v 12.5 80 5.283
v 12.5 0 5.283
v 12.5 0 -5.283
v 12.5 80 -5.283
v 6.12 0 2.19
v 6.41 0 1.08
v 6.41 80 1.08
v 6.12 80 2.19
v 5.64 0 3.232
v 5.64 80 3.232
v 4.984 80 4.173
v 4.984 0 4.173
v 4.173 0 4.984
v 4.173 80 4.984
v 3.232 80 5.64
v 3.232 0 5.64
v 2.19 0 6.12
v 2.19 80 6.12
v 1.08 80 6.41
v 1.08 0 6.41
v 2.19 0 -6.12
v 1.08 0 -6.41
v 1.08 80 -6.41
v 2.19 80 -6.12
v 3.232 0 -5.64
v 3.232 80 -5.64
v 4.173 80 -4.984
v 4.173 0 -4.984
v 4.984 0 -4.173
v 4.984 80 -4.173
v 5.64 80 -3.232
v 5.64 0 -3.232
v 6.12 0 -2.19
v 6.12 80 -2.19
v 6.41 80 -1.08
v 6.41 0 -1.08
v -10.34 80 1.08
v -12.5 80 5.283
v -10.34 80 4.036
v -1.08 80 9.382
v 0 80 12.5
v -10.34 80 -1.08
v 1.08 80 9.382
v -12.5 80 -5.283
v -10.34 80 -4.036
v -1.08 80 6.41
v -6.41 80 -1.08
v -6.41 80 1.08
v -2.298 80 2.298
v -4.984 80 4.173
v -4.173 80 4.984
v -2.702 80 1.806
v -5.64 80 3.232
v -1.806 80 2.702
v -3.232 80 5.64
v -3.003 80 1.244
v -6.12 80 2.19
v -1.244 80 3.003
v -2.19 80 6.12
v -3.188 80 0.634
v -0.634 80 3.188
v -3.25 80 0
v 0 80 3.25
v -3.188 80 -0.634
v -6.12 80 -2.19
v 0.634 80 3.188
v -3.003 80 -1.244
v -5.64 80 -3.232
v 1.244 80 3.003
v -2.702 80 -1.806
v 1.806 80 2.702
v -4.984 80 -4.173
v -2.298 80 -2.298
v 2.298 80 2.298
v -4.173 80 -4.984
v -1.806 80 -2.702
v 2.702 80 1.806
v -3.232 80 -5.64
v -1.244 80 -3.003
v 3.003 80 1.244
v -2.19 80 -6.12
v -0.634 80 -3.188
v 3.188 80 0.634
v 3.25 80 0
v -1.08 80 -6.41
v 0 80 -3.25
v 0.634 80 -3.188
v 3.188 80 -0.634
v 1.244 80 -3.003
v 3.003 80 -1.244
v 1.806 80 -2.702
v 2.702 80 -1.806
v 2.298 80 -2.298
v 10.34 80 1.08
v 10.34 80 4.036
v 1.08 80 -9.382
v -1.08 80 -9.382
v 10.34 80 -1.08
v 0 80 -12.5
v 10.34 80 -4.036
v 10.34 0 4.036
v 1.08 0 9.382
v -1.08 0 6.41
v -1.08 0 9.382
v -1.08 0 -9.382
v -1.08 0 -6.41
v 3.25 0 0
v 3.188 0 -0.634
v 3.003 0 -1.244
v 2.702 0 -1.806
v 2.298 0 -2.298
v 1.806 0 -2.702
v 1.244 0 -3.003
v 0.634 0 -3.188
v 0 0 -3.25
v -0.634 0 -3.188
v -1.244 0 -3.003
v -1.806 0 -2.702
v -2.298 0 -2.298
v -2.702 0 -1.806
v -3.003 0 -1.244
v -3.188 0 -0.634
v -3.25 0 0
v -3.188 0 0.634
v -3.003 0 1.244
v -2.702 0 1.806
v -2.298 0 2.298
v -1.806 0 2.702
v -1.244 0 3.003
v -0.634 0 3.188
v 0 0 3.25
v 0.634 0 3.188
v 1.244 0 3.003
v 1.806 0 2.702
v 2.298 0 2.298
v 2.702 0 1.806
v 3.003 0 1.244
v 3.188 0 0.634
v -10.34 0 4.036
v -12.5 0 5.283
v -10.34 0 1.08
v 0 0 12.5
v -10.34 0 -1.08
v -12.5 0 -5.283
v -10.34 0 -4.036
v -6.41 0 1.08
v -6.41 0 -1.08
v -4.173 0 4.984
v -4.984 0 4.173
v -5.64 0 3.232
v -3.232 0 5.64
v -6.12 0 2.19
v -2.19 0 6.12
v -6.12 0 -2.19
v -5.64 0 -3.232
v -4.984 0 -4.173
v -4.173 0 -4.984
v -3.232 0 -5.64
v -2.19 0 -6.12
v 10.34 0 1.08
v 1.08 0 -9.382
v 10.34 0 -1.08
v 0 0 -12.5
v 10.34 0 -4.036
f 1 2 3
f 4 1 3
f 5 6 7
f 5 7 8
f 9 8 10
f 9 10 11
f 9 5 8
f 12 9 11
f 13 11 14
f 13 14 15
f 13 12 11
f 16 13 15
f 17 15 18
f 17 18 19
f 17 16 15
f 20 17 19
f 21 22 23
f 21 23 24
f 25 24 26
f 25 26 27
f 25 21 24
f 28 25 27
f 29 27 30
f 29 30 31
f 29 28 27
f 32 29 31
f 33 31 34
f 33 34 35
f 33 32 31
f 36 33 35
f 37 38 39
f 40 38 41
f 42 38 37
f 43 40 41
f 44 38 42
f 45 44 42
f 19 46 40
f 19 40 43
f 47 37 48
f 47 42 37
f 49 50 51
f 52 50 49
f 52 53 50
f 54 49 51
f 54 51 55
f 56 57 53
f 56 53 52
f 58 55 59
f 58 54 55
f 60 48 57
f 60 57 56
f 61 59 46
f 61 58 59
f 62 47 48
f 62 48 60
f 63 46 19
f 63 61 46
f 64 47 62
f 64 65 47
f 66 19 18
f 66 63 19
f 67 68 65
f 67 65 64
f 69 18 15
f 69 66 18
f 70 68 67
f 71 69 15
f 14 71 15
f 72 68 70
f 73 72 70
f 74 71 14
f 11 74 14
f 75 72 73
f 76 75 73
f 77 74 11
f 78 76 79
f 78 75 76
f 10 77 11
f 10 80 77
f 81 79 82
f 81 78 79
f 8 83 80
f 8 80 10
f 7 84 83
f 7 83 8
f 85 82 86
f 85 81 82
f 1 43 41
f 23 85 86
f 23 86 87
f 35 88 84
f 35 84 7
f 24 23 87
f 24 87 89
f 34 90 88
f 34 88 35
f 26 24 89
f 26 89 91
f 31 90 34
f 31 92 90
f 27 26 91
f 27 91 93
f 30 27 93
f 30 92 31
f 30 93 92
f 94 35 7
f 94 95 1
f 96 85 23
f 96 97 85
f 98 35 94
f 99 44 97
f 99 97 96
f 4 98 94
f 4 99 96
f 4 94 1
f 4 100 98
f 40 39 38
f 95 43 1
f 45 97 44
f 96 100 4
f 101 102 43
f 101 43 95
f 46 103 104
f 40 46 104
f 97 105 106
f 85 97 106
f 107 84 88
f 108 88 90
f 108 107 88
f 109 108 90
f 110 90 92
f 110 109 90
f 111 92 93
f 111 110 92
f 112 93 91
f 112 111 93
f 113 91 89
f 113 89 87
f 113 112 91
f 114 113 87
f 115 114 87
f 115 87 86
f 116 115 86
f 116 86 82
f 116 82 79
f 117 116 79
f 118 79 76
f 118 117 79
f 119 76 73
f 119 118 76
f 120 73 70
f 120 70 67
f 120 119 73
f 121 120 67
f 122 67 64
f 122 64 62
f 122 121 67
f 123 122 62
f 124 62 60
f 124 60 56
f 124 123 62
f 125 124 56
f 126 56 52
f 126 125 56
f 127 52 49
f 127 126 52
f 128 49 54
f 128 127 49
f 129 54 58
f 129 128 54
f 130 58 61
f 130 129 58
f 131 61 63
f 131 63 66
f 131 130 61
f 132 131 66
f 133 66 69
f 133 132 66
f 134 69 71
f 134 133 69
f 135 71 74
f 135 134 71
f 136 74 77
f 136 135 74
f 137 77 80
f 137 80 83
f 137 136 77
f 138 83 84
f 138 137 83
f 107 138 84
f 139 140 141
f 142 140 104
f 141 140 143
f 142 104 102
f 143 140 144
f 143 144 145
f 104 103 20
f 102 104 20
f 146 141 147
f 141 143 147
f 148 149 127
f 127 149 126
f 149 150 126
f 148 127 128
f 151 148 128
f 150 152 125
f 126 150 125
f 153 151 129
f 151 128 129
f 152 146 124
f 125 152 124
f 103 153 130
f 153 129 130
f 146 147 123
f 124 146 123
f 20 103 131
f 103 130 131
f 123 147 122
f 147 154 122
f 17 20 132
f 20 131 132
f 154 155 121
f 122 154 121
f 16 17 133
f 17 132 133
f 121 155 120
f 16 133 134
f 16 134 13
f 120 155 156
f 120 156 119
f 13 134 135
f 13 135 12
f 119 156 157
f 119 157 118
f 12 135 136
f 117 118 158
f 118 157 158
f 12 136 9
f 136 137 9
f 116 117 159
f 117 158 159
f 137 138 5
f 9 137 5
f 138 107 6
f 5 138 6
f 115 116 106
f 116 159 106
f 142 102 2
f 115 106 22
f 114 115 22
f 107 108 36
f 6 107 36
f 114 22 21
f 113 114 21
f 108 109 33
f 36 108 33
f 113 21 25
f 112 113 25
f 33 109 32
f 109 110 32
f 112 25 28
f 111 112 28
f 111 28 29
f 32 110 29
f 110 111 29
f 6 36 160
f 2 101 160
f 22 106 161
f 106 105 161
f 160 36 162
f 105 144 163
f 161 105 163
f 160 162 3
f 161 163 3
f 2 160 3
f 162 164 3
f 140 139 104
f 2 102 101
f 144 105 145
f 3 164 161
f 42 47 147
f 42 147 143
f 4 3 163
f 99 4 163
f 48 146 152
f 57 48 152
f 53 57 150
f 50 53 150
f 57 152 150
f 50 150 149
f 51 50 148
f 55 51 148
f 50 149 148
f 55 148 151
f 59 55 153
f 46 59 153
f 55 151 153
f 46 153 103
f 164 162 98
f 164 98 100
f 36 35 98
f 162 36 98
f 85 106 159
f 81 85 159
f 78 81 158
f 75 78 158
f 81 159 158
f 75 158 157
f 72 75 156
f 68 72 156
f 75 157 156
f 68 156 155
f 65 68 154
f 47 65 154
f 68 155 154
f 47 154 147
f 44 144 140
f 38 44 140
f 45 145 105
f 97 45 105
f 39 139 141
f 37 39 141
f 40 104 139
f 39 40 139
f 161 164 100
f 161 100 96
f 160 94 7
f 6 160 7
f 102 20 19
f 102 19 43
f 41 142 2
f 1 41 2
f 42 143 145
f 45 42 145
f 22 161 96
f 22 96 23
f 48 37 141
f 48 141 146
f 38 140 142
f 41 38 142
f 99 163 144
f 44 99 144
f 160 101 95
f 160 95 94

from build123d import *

# Parameters (mm, degrees)
SKETCH1_R           = 3.25
BOSS_EXTRUDE2_DEPTH = 80


with BuildPart() as part:
    # Sketch1 → Boss-Extrude2 (new body)
    with BuildSketch(Plane(origin=(0, 0, 0), x_dir=(1, 0, 0), z_dir=(0, 1, 0))):
        Polygon((-12.5, 5.283121635), (-12.5, -5.283121635), (0, -12.5), (12.5, -5.283121635), (12.5, 5.283121635), (0, 12.5), align=None)
        Circle(SKETCH1_R, mode=Mode.SUBTRACT)
        with BuildLine():
            Line((-1.08, 9.382308546), (-1.08, 6.409648976))
            ThreePointArc((-1.08, 6.409648976), (-4.596194078, 4.596194078), (-6.409648976, 1.08))
            Line((-6.409648976, 1.08), (-10.34, 1.08))
            Line((-10.34, 1.08), (-10.34, 4.036045054))
            Line((-10.34, 4.036045054), (-1.08, 9.382308546))
        make_face(mode=Mode.SUBTRACT)
        with BuildLine():
            Line((1.08, 9.382308546), (1.08, 6.409648976))
            ThreePointArc((1.08, 6.409648976), (4.596194078, 4.596194078), (6.409648976, 1.08))
            Line((6.409648976, 1.08), (10.34, 1.08))
            Line((10.34, 1.08), (10.34, 4.036045054))
            Line((10.34, 4.036045054), (1.08, 9.382308546))
        make_face(mode=Mode.SUBTRACT)
        with BuildLine():
            Line((-10.34, -1.08), (-6.409648976, -1.08))
            ThreePointArc((-6.409648976, -1.08), (-4.596194078, -4.596194078), (-1.08, -6.409648976))
            Line((-1.08, -6.409648976), (-1.08, -9.382308546))
            Line((-1.08, -9.382308546), (-10.34, -4.036045054))
            Line((-10.34, -4.036045054), (-10.34, -1.08))
        make_face(mode=Mode.SUBTRACT)
        with BuildLine():
            Line((1.08, -6.409648976), (1.08, -9.382308546))
            Line((1.08, -9.382308546), (10.34, -4.036045054))
            Line((10.34, -4.036045054), (10.34, -1.08))
            Line((10.34, -1.08), (6.409648976, -1.08))
            ThreePointArc((6.409648976, -1.08), (4.596194078, -4.596194078), (1.08, -6.409648976))
        make_face(mode=Mode.SUBTRACT)
    extrude(amount=BOSS_EXTRUDE2_DEPTH)


solid = part.part
